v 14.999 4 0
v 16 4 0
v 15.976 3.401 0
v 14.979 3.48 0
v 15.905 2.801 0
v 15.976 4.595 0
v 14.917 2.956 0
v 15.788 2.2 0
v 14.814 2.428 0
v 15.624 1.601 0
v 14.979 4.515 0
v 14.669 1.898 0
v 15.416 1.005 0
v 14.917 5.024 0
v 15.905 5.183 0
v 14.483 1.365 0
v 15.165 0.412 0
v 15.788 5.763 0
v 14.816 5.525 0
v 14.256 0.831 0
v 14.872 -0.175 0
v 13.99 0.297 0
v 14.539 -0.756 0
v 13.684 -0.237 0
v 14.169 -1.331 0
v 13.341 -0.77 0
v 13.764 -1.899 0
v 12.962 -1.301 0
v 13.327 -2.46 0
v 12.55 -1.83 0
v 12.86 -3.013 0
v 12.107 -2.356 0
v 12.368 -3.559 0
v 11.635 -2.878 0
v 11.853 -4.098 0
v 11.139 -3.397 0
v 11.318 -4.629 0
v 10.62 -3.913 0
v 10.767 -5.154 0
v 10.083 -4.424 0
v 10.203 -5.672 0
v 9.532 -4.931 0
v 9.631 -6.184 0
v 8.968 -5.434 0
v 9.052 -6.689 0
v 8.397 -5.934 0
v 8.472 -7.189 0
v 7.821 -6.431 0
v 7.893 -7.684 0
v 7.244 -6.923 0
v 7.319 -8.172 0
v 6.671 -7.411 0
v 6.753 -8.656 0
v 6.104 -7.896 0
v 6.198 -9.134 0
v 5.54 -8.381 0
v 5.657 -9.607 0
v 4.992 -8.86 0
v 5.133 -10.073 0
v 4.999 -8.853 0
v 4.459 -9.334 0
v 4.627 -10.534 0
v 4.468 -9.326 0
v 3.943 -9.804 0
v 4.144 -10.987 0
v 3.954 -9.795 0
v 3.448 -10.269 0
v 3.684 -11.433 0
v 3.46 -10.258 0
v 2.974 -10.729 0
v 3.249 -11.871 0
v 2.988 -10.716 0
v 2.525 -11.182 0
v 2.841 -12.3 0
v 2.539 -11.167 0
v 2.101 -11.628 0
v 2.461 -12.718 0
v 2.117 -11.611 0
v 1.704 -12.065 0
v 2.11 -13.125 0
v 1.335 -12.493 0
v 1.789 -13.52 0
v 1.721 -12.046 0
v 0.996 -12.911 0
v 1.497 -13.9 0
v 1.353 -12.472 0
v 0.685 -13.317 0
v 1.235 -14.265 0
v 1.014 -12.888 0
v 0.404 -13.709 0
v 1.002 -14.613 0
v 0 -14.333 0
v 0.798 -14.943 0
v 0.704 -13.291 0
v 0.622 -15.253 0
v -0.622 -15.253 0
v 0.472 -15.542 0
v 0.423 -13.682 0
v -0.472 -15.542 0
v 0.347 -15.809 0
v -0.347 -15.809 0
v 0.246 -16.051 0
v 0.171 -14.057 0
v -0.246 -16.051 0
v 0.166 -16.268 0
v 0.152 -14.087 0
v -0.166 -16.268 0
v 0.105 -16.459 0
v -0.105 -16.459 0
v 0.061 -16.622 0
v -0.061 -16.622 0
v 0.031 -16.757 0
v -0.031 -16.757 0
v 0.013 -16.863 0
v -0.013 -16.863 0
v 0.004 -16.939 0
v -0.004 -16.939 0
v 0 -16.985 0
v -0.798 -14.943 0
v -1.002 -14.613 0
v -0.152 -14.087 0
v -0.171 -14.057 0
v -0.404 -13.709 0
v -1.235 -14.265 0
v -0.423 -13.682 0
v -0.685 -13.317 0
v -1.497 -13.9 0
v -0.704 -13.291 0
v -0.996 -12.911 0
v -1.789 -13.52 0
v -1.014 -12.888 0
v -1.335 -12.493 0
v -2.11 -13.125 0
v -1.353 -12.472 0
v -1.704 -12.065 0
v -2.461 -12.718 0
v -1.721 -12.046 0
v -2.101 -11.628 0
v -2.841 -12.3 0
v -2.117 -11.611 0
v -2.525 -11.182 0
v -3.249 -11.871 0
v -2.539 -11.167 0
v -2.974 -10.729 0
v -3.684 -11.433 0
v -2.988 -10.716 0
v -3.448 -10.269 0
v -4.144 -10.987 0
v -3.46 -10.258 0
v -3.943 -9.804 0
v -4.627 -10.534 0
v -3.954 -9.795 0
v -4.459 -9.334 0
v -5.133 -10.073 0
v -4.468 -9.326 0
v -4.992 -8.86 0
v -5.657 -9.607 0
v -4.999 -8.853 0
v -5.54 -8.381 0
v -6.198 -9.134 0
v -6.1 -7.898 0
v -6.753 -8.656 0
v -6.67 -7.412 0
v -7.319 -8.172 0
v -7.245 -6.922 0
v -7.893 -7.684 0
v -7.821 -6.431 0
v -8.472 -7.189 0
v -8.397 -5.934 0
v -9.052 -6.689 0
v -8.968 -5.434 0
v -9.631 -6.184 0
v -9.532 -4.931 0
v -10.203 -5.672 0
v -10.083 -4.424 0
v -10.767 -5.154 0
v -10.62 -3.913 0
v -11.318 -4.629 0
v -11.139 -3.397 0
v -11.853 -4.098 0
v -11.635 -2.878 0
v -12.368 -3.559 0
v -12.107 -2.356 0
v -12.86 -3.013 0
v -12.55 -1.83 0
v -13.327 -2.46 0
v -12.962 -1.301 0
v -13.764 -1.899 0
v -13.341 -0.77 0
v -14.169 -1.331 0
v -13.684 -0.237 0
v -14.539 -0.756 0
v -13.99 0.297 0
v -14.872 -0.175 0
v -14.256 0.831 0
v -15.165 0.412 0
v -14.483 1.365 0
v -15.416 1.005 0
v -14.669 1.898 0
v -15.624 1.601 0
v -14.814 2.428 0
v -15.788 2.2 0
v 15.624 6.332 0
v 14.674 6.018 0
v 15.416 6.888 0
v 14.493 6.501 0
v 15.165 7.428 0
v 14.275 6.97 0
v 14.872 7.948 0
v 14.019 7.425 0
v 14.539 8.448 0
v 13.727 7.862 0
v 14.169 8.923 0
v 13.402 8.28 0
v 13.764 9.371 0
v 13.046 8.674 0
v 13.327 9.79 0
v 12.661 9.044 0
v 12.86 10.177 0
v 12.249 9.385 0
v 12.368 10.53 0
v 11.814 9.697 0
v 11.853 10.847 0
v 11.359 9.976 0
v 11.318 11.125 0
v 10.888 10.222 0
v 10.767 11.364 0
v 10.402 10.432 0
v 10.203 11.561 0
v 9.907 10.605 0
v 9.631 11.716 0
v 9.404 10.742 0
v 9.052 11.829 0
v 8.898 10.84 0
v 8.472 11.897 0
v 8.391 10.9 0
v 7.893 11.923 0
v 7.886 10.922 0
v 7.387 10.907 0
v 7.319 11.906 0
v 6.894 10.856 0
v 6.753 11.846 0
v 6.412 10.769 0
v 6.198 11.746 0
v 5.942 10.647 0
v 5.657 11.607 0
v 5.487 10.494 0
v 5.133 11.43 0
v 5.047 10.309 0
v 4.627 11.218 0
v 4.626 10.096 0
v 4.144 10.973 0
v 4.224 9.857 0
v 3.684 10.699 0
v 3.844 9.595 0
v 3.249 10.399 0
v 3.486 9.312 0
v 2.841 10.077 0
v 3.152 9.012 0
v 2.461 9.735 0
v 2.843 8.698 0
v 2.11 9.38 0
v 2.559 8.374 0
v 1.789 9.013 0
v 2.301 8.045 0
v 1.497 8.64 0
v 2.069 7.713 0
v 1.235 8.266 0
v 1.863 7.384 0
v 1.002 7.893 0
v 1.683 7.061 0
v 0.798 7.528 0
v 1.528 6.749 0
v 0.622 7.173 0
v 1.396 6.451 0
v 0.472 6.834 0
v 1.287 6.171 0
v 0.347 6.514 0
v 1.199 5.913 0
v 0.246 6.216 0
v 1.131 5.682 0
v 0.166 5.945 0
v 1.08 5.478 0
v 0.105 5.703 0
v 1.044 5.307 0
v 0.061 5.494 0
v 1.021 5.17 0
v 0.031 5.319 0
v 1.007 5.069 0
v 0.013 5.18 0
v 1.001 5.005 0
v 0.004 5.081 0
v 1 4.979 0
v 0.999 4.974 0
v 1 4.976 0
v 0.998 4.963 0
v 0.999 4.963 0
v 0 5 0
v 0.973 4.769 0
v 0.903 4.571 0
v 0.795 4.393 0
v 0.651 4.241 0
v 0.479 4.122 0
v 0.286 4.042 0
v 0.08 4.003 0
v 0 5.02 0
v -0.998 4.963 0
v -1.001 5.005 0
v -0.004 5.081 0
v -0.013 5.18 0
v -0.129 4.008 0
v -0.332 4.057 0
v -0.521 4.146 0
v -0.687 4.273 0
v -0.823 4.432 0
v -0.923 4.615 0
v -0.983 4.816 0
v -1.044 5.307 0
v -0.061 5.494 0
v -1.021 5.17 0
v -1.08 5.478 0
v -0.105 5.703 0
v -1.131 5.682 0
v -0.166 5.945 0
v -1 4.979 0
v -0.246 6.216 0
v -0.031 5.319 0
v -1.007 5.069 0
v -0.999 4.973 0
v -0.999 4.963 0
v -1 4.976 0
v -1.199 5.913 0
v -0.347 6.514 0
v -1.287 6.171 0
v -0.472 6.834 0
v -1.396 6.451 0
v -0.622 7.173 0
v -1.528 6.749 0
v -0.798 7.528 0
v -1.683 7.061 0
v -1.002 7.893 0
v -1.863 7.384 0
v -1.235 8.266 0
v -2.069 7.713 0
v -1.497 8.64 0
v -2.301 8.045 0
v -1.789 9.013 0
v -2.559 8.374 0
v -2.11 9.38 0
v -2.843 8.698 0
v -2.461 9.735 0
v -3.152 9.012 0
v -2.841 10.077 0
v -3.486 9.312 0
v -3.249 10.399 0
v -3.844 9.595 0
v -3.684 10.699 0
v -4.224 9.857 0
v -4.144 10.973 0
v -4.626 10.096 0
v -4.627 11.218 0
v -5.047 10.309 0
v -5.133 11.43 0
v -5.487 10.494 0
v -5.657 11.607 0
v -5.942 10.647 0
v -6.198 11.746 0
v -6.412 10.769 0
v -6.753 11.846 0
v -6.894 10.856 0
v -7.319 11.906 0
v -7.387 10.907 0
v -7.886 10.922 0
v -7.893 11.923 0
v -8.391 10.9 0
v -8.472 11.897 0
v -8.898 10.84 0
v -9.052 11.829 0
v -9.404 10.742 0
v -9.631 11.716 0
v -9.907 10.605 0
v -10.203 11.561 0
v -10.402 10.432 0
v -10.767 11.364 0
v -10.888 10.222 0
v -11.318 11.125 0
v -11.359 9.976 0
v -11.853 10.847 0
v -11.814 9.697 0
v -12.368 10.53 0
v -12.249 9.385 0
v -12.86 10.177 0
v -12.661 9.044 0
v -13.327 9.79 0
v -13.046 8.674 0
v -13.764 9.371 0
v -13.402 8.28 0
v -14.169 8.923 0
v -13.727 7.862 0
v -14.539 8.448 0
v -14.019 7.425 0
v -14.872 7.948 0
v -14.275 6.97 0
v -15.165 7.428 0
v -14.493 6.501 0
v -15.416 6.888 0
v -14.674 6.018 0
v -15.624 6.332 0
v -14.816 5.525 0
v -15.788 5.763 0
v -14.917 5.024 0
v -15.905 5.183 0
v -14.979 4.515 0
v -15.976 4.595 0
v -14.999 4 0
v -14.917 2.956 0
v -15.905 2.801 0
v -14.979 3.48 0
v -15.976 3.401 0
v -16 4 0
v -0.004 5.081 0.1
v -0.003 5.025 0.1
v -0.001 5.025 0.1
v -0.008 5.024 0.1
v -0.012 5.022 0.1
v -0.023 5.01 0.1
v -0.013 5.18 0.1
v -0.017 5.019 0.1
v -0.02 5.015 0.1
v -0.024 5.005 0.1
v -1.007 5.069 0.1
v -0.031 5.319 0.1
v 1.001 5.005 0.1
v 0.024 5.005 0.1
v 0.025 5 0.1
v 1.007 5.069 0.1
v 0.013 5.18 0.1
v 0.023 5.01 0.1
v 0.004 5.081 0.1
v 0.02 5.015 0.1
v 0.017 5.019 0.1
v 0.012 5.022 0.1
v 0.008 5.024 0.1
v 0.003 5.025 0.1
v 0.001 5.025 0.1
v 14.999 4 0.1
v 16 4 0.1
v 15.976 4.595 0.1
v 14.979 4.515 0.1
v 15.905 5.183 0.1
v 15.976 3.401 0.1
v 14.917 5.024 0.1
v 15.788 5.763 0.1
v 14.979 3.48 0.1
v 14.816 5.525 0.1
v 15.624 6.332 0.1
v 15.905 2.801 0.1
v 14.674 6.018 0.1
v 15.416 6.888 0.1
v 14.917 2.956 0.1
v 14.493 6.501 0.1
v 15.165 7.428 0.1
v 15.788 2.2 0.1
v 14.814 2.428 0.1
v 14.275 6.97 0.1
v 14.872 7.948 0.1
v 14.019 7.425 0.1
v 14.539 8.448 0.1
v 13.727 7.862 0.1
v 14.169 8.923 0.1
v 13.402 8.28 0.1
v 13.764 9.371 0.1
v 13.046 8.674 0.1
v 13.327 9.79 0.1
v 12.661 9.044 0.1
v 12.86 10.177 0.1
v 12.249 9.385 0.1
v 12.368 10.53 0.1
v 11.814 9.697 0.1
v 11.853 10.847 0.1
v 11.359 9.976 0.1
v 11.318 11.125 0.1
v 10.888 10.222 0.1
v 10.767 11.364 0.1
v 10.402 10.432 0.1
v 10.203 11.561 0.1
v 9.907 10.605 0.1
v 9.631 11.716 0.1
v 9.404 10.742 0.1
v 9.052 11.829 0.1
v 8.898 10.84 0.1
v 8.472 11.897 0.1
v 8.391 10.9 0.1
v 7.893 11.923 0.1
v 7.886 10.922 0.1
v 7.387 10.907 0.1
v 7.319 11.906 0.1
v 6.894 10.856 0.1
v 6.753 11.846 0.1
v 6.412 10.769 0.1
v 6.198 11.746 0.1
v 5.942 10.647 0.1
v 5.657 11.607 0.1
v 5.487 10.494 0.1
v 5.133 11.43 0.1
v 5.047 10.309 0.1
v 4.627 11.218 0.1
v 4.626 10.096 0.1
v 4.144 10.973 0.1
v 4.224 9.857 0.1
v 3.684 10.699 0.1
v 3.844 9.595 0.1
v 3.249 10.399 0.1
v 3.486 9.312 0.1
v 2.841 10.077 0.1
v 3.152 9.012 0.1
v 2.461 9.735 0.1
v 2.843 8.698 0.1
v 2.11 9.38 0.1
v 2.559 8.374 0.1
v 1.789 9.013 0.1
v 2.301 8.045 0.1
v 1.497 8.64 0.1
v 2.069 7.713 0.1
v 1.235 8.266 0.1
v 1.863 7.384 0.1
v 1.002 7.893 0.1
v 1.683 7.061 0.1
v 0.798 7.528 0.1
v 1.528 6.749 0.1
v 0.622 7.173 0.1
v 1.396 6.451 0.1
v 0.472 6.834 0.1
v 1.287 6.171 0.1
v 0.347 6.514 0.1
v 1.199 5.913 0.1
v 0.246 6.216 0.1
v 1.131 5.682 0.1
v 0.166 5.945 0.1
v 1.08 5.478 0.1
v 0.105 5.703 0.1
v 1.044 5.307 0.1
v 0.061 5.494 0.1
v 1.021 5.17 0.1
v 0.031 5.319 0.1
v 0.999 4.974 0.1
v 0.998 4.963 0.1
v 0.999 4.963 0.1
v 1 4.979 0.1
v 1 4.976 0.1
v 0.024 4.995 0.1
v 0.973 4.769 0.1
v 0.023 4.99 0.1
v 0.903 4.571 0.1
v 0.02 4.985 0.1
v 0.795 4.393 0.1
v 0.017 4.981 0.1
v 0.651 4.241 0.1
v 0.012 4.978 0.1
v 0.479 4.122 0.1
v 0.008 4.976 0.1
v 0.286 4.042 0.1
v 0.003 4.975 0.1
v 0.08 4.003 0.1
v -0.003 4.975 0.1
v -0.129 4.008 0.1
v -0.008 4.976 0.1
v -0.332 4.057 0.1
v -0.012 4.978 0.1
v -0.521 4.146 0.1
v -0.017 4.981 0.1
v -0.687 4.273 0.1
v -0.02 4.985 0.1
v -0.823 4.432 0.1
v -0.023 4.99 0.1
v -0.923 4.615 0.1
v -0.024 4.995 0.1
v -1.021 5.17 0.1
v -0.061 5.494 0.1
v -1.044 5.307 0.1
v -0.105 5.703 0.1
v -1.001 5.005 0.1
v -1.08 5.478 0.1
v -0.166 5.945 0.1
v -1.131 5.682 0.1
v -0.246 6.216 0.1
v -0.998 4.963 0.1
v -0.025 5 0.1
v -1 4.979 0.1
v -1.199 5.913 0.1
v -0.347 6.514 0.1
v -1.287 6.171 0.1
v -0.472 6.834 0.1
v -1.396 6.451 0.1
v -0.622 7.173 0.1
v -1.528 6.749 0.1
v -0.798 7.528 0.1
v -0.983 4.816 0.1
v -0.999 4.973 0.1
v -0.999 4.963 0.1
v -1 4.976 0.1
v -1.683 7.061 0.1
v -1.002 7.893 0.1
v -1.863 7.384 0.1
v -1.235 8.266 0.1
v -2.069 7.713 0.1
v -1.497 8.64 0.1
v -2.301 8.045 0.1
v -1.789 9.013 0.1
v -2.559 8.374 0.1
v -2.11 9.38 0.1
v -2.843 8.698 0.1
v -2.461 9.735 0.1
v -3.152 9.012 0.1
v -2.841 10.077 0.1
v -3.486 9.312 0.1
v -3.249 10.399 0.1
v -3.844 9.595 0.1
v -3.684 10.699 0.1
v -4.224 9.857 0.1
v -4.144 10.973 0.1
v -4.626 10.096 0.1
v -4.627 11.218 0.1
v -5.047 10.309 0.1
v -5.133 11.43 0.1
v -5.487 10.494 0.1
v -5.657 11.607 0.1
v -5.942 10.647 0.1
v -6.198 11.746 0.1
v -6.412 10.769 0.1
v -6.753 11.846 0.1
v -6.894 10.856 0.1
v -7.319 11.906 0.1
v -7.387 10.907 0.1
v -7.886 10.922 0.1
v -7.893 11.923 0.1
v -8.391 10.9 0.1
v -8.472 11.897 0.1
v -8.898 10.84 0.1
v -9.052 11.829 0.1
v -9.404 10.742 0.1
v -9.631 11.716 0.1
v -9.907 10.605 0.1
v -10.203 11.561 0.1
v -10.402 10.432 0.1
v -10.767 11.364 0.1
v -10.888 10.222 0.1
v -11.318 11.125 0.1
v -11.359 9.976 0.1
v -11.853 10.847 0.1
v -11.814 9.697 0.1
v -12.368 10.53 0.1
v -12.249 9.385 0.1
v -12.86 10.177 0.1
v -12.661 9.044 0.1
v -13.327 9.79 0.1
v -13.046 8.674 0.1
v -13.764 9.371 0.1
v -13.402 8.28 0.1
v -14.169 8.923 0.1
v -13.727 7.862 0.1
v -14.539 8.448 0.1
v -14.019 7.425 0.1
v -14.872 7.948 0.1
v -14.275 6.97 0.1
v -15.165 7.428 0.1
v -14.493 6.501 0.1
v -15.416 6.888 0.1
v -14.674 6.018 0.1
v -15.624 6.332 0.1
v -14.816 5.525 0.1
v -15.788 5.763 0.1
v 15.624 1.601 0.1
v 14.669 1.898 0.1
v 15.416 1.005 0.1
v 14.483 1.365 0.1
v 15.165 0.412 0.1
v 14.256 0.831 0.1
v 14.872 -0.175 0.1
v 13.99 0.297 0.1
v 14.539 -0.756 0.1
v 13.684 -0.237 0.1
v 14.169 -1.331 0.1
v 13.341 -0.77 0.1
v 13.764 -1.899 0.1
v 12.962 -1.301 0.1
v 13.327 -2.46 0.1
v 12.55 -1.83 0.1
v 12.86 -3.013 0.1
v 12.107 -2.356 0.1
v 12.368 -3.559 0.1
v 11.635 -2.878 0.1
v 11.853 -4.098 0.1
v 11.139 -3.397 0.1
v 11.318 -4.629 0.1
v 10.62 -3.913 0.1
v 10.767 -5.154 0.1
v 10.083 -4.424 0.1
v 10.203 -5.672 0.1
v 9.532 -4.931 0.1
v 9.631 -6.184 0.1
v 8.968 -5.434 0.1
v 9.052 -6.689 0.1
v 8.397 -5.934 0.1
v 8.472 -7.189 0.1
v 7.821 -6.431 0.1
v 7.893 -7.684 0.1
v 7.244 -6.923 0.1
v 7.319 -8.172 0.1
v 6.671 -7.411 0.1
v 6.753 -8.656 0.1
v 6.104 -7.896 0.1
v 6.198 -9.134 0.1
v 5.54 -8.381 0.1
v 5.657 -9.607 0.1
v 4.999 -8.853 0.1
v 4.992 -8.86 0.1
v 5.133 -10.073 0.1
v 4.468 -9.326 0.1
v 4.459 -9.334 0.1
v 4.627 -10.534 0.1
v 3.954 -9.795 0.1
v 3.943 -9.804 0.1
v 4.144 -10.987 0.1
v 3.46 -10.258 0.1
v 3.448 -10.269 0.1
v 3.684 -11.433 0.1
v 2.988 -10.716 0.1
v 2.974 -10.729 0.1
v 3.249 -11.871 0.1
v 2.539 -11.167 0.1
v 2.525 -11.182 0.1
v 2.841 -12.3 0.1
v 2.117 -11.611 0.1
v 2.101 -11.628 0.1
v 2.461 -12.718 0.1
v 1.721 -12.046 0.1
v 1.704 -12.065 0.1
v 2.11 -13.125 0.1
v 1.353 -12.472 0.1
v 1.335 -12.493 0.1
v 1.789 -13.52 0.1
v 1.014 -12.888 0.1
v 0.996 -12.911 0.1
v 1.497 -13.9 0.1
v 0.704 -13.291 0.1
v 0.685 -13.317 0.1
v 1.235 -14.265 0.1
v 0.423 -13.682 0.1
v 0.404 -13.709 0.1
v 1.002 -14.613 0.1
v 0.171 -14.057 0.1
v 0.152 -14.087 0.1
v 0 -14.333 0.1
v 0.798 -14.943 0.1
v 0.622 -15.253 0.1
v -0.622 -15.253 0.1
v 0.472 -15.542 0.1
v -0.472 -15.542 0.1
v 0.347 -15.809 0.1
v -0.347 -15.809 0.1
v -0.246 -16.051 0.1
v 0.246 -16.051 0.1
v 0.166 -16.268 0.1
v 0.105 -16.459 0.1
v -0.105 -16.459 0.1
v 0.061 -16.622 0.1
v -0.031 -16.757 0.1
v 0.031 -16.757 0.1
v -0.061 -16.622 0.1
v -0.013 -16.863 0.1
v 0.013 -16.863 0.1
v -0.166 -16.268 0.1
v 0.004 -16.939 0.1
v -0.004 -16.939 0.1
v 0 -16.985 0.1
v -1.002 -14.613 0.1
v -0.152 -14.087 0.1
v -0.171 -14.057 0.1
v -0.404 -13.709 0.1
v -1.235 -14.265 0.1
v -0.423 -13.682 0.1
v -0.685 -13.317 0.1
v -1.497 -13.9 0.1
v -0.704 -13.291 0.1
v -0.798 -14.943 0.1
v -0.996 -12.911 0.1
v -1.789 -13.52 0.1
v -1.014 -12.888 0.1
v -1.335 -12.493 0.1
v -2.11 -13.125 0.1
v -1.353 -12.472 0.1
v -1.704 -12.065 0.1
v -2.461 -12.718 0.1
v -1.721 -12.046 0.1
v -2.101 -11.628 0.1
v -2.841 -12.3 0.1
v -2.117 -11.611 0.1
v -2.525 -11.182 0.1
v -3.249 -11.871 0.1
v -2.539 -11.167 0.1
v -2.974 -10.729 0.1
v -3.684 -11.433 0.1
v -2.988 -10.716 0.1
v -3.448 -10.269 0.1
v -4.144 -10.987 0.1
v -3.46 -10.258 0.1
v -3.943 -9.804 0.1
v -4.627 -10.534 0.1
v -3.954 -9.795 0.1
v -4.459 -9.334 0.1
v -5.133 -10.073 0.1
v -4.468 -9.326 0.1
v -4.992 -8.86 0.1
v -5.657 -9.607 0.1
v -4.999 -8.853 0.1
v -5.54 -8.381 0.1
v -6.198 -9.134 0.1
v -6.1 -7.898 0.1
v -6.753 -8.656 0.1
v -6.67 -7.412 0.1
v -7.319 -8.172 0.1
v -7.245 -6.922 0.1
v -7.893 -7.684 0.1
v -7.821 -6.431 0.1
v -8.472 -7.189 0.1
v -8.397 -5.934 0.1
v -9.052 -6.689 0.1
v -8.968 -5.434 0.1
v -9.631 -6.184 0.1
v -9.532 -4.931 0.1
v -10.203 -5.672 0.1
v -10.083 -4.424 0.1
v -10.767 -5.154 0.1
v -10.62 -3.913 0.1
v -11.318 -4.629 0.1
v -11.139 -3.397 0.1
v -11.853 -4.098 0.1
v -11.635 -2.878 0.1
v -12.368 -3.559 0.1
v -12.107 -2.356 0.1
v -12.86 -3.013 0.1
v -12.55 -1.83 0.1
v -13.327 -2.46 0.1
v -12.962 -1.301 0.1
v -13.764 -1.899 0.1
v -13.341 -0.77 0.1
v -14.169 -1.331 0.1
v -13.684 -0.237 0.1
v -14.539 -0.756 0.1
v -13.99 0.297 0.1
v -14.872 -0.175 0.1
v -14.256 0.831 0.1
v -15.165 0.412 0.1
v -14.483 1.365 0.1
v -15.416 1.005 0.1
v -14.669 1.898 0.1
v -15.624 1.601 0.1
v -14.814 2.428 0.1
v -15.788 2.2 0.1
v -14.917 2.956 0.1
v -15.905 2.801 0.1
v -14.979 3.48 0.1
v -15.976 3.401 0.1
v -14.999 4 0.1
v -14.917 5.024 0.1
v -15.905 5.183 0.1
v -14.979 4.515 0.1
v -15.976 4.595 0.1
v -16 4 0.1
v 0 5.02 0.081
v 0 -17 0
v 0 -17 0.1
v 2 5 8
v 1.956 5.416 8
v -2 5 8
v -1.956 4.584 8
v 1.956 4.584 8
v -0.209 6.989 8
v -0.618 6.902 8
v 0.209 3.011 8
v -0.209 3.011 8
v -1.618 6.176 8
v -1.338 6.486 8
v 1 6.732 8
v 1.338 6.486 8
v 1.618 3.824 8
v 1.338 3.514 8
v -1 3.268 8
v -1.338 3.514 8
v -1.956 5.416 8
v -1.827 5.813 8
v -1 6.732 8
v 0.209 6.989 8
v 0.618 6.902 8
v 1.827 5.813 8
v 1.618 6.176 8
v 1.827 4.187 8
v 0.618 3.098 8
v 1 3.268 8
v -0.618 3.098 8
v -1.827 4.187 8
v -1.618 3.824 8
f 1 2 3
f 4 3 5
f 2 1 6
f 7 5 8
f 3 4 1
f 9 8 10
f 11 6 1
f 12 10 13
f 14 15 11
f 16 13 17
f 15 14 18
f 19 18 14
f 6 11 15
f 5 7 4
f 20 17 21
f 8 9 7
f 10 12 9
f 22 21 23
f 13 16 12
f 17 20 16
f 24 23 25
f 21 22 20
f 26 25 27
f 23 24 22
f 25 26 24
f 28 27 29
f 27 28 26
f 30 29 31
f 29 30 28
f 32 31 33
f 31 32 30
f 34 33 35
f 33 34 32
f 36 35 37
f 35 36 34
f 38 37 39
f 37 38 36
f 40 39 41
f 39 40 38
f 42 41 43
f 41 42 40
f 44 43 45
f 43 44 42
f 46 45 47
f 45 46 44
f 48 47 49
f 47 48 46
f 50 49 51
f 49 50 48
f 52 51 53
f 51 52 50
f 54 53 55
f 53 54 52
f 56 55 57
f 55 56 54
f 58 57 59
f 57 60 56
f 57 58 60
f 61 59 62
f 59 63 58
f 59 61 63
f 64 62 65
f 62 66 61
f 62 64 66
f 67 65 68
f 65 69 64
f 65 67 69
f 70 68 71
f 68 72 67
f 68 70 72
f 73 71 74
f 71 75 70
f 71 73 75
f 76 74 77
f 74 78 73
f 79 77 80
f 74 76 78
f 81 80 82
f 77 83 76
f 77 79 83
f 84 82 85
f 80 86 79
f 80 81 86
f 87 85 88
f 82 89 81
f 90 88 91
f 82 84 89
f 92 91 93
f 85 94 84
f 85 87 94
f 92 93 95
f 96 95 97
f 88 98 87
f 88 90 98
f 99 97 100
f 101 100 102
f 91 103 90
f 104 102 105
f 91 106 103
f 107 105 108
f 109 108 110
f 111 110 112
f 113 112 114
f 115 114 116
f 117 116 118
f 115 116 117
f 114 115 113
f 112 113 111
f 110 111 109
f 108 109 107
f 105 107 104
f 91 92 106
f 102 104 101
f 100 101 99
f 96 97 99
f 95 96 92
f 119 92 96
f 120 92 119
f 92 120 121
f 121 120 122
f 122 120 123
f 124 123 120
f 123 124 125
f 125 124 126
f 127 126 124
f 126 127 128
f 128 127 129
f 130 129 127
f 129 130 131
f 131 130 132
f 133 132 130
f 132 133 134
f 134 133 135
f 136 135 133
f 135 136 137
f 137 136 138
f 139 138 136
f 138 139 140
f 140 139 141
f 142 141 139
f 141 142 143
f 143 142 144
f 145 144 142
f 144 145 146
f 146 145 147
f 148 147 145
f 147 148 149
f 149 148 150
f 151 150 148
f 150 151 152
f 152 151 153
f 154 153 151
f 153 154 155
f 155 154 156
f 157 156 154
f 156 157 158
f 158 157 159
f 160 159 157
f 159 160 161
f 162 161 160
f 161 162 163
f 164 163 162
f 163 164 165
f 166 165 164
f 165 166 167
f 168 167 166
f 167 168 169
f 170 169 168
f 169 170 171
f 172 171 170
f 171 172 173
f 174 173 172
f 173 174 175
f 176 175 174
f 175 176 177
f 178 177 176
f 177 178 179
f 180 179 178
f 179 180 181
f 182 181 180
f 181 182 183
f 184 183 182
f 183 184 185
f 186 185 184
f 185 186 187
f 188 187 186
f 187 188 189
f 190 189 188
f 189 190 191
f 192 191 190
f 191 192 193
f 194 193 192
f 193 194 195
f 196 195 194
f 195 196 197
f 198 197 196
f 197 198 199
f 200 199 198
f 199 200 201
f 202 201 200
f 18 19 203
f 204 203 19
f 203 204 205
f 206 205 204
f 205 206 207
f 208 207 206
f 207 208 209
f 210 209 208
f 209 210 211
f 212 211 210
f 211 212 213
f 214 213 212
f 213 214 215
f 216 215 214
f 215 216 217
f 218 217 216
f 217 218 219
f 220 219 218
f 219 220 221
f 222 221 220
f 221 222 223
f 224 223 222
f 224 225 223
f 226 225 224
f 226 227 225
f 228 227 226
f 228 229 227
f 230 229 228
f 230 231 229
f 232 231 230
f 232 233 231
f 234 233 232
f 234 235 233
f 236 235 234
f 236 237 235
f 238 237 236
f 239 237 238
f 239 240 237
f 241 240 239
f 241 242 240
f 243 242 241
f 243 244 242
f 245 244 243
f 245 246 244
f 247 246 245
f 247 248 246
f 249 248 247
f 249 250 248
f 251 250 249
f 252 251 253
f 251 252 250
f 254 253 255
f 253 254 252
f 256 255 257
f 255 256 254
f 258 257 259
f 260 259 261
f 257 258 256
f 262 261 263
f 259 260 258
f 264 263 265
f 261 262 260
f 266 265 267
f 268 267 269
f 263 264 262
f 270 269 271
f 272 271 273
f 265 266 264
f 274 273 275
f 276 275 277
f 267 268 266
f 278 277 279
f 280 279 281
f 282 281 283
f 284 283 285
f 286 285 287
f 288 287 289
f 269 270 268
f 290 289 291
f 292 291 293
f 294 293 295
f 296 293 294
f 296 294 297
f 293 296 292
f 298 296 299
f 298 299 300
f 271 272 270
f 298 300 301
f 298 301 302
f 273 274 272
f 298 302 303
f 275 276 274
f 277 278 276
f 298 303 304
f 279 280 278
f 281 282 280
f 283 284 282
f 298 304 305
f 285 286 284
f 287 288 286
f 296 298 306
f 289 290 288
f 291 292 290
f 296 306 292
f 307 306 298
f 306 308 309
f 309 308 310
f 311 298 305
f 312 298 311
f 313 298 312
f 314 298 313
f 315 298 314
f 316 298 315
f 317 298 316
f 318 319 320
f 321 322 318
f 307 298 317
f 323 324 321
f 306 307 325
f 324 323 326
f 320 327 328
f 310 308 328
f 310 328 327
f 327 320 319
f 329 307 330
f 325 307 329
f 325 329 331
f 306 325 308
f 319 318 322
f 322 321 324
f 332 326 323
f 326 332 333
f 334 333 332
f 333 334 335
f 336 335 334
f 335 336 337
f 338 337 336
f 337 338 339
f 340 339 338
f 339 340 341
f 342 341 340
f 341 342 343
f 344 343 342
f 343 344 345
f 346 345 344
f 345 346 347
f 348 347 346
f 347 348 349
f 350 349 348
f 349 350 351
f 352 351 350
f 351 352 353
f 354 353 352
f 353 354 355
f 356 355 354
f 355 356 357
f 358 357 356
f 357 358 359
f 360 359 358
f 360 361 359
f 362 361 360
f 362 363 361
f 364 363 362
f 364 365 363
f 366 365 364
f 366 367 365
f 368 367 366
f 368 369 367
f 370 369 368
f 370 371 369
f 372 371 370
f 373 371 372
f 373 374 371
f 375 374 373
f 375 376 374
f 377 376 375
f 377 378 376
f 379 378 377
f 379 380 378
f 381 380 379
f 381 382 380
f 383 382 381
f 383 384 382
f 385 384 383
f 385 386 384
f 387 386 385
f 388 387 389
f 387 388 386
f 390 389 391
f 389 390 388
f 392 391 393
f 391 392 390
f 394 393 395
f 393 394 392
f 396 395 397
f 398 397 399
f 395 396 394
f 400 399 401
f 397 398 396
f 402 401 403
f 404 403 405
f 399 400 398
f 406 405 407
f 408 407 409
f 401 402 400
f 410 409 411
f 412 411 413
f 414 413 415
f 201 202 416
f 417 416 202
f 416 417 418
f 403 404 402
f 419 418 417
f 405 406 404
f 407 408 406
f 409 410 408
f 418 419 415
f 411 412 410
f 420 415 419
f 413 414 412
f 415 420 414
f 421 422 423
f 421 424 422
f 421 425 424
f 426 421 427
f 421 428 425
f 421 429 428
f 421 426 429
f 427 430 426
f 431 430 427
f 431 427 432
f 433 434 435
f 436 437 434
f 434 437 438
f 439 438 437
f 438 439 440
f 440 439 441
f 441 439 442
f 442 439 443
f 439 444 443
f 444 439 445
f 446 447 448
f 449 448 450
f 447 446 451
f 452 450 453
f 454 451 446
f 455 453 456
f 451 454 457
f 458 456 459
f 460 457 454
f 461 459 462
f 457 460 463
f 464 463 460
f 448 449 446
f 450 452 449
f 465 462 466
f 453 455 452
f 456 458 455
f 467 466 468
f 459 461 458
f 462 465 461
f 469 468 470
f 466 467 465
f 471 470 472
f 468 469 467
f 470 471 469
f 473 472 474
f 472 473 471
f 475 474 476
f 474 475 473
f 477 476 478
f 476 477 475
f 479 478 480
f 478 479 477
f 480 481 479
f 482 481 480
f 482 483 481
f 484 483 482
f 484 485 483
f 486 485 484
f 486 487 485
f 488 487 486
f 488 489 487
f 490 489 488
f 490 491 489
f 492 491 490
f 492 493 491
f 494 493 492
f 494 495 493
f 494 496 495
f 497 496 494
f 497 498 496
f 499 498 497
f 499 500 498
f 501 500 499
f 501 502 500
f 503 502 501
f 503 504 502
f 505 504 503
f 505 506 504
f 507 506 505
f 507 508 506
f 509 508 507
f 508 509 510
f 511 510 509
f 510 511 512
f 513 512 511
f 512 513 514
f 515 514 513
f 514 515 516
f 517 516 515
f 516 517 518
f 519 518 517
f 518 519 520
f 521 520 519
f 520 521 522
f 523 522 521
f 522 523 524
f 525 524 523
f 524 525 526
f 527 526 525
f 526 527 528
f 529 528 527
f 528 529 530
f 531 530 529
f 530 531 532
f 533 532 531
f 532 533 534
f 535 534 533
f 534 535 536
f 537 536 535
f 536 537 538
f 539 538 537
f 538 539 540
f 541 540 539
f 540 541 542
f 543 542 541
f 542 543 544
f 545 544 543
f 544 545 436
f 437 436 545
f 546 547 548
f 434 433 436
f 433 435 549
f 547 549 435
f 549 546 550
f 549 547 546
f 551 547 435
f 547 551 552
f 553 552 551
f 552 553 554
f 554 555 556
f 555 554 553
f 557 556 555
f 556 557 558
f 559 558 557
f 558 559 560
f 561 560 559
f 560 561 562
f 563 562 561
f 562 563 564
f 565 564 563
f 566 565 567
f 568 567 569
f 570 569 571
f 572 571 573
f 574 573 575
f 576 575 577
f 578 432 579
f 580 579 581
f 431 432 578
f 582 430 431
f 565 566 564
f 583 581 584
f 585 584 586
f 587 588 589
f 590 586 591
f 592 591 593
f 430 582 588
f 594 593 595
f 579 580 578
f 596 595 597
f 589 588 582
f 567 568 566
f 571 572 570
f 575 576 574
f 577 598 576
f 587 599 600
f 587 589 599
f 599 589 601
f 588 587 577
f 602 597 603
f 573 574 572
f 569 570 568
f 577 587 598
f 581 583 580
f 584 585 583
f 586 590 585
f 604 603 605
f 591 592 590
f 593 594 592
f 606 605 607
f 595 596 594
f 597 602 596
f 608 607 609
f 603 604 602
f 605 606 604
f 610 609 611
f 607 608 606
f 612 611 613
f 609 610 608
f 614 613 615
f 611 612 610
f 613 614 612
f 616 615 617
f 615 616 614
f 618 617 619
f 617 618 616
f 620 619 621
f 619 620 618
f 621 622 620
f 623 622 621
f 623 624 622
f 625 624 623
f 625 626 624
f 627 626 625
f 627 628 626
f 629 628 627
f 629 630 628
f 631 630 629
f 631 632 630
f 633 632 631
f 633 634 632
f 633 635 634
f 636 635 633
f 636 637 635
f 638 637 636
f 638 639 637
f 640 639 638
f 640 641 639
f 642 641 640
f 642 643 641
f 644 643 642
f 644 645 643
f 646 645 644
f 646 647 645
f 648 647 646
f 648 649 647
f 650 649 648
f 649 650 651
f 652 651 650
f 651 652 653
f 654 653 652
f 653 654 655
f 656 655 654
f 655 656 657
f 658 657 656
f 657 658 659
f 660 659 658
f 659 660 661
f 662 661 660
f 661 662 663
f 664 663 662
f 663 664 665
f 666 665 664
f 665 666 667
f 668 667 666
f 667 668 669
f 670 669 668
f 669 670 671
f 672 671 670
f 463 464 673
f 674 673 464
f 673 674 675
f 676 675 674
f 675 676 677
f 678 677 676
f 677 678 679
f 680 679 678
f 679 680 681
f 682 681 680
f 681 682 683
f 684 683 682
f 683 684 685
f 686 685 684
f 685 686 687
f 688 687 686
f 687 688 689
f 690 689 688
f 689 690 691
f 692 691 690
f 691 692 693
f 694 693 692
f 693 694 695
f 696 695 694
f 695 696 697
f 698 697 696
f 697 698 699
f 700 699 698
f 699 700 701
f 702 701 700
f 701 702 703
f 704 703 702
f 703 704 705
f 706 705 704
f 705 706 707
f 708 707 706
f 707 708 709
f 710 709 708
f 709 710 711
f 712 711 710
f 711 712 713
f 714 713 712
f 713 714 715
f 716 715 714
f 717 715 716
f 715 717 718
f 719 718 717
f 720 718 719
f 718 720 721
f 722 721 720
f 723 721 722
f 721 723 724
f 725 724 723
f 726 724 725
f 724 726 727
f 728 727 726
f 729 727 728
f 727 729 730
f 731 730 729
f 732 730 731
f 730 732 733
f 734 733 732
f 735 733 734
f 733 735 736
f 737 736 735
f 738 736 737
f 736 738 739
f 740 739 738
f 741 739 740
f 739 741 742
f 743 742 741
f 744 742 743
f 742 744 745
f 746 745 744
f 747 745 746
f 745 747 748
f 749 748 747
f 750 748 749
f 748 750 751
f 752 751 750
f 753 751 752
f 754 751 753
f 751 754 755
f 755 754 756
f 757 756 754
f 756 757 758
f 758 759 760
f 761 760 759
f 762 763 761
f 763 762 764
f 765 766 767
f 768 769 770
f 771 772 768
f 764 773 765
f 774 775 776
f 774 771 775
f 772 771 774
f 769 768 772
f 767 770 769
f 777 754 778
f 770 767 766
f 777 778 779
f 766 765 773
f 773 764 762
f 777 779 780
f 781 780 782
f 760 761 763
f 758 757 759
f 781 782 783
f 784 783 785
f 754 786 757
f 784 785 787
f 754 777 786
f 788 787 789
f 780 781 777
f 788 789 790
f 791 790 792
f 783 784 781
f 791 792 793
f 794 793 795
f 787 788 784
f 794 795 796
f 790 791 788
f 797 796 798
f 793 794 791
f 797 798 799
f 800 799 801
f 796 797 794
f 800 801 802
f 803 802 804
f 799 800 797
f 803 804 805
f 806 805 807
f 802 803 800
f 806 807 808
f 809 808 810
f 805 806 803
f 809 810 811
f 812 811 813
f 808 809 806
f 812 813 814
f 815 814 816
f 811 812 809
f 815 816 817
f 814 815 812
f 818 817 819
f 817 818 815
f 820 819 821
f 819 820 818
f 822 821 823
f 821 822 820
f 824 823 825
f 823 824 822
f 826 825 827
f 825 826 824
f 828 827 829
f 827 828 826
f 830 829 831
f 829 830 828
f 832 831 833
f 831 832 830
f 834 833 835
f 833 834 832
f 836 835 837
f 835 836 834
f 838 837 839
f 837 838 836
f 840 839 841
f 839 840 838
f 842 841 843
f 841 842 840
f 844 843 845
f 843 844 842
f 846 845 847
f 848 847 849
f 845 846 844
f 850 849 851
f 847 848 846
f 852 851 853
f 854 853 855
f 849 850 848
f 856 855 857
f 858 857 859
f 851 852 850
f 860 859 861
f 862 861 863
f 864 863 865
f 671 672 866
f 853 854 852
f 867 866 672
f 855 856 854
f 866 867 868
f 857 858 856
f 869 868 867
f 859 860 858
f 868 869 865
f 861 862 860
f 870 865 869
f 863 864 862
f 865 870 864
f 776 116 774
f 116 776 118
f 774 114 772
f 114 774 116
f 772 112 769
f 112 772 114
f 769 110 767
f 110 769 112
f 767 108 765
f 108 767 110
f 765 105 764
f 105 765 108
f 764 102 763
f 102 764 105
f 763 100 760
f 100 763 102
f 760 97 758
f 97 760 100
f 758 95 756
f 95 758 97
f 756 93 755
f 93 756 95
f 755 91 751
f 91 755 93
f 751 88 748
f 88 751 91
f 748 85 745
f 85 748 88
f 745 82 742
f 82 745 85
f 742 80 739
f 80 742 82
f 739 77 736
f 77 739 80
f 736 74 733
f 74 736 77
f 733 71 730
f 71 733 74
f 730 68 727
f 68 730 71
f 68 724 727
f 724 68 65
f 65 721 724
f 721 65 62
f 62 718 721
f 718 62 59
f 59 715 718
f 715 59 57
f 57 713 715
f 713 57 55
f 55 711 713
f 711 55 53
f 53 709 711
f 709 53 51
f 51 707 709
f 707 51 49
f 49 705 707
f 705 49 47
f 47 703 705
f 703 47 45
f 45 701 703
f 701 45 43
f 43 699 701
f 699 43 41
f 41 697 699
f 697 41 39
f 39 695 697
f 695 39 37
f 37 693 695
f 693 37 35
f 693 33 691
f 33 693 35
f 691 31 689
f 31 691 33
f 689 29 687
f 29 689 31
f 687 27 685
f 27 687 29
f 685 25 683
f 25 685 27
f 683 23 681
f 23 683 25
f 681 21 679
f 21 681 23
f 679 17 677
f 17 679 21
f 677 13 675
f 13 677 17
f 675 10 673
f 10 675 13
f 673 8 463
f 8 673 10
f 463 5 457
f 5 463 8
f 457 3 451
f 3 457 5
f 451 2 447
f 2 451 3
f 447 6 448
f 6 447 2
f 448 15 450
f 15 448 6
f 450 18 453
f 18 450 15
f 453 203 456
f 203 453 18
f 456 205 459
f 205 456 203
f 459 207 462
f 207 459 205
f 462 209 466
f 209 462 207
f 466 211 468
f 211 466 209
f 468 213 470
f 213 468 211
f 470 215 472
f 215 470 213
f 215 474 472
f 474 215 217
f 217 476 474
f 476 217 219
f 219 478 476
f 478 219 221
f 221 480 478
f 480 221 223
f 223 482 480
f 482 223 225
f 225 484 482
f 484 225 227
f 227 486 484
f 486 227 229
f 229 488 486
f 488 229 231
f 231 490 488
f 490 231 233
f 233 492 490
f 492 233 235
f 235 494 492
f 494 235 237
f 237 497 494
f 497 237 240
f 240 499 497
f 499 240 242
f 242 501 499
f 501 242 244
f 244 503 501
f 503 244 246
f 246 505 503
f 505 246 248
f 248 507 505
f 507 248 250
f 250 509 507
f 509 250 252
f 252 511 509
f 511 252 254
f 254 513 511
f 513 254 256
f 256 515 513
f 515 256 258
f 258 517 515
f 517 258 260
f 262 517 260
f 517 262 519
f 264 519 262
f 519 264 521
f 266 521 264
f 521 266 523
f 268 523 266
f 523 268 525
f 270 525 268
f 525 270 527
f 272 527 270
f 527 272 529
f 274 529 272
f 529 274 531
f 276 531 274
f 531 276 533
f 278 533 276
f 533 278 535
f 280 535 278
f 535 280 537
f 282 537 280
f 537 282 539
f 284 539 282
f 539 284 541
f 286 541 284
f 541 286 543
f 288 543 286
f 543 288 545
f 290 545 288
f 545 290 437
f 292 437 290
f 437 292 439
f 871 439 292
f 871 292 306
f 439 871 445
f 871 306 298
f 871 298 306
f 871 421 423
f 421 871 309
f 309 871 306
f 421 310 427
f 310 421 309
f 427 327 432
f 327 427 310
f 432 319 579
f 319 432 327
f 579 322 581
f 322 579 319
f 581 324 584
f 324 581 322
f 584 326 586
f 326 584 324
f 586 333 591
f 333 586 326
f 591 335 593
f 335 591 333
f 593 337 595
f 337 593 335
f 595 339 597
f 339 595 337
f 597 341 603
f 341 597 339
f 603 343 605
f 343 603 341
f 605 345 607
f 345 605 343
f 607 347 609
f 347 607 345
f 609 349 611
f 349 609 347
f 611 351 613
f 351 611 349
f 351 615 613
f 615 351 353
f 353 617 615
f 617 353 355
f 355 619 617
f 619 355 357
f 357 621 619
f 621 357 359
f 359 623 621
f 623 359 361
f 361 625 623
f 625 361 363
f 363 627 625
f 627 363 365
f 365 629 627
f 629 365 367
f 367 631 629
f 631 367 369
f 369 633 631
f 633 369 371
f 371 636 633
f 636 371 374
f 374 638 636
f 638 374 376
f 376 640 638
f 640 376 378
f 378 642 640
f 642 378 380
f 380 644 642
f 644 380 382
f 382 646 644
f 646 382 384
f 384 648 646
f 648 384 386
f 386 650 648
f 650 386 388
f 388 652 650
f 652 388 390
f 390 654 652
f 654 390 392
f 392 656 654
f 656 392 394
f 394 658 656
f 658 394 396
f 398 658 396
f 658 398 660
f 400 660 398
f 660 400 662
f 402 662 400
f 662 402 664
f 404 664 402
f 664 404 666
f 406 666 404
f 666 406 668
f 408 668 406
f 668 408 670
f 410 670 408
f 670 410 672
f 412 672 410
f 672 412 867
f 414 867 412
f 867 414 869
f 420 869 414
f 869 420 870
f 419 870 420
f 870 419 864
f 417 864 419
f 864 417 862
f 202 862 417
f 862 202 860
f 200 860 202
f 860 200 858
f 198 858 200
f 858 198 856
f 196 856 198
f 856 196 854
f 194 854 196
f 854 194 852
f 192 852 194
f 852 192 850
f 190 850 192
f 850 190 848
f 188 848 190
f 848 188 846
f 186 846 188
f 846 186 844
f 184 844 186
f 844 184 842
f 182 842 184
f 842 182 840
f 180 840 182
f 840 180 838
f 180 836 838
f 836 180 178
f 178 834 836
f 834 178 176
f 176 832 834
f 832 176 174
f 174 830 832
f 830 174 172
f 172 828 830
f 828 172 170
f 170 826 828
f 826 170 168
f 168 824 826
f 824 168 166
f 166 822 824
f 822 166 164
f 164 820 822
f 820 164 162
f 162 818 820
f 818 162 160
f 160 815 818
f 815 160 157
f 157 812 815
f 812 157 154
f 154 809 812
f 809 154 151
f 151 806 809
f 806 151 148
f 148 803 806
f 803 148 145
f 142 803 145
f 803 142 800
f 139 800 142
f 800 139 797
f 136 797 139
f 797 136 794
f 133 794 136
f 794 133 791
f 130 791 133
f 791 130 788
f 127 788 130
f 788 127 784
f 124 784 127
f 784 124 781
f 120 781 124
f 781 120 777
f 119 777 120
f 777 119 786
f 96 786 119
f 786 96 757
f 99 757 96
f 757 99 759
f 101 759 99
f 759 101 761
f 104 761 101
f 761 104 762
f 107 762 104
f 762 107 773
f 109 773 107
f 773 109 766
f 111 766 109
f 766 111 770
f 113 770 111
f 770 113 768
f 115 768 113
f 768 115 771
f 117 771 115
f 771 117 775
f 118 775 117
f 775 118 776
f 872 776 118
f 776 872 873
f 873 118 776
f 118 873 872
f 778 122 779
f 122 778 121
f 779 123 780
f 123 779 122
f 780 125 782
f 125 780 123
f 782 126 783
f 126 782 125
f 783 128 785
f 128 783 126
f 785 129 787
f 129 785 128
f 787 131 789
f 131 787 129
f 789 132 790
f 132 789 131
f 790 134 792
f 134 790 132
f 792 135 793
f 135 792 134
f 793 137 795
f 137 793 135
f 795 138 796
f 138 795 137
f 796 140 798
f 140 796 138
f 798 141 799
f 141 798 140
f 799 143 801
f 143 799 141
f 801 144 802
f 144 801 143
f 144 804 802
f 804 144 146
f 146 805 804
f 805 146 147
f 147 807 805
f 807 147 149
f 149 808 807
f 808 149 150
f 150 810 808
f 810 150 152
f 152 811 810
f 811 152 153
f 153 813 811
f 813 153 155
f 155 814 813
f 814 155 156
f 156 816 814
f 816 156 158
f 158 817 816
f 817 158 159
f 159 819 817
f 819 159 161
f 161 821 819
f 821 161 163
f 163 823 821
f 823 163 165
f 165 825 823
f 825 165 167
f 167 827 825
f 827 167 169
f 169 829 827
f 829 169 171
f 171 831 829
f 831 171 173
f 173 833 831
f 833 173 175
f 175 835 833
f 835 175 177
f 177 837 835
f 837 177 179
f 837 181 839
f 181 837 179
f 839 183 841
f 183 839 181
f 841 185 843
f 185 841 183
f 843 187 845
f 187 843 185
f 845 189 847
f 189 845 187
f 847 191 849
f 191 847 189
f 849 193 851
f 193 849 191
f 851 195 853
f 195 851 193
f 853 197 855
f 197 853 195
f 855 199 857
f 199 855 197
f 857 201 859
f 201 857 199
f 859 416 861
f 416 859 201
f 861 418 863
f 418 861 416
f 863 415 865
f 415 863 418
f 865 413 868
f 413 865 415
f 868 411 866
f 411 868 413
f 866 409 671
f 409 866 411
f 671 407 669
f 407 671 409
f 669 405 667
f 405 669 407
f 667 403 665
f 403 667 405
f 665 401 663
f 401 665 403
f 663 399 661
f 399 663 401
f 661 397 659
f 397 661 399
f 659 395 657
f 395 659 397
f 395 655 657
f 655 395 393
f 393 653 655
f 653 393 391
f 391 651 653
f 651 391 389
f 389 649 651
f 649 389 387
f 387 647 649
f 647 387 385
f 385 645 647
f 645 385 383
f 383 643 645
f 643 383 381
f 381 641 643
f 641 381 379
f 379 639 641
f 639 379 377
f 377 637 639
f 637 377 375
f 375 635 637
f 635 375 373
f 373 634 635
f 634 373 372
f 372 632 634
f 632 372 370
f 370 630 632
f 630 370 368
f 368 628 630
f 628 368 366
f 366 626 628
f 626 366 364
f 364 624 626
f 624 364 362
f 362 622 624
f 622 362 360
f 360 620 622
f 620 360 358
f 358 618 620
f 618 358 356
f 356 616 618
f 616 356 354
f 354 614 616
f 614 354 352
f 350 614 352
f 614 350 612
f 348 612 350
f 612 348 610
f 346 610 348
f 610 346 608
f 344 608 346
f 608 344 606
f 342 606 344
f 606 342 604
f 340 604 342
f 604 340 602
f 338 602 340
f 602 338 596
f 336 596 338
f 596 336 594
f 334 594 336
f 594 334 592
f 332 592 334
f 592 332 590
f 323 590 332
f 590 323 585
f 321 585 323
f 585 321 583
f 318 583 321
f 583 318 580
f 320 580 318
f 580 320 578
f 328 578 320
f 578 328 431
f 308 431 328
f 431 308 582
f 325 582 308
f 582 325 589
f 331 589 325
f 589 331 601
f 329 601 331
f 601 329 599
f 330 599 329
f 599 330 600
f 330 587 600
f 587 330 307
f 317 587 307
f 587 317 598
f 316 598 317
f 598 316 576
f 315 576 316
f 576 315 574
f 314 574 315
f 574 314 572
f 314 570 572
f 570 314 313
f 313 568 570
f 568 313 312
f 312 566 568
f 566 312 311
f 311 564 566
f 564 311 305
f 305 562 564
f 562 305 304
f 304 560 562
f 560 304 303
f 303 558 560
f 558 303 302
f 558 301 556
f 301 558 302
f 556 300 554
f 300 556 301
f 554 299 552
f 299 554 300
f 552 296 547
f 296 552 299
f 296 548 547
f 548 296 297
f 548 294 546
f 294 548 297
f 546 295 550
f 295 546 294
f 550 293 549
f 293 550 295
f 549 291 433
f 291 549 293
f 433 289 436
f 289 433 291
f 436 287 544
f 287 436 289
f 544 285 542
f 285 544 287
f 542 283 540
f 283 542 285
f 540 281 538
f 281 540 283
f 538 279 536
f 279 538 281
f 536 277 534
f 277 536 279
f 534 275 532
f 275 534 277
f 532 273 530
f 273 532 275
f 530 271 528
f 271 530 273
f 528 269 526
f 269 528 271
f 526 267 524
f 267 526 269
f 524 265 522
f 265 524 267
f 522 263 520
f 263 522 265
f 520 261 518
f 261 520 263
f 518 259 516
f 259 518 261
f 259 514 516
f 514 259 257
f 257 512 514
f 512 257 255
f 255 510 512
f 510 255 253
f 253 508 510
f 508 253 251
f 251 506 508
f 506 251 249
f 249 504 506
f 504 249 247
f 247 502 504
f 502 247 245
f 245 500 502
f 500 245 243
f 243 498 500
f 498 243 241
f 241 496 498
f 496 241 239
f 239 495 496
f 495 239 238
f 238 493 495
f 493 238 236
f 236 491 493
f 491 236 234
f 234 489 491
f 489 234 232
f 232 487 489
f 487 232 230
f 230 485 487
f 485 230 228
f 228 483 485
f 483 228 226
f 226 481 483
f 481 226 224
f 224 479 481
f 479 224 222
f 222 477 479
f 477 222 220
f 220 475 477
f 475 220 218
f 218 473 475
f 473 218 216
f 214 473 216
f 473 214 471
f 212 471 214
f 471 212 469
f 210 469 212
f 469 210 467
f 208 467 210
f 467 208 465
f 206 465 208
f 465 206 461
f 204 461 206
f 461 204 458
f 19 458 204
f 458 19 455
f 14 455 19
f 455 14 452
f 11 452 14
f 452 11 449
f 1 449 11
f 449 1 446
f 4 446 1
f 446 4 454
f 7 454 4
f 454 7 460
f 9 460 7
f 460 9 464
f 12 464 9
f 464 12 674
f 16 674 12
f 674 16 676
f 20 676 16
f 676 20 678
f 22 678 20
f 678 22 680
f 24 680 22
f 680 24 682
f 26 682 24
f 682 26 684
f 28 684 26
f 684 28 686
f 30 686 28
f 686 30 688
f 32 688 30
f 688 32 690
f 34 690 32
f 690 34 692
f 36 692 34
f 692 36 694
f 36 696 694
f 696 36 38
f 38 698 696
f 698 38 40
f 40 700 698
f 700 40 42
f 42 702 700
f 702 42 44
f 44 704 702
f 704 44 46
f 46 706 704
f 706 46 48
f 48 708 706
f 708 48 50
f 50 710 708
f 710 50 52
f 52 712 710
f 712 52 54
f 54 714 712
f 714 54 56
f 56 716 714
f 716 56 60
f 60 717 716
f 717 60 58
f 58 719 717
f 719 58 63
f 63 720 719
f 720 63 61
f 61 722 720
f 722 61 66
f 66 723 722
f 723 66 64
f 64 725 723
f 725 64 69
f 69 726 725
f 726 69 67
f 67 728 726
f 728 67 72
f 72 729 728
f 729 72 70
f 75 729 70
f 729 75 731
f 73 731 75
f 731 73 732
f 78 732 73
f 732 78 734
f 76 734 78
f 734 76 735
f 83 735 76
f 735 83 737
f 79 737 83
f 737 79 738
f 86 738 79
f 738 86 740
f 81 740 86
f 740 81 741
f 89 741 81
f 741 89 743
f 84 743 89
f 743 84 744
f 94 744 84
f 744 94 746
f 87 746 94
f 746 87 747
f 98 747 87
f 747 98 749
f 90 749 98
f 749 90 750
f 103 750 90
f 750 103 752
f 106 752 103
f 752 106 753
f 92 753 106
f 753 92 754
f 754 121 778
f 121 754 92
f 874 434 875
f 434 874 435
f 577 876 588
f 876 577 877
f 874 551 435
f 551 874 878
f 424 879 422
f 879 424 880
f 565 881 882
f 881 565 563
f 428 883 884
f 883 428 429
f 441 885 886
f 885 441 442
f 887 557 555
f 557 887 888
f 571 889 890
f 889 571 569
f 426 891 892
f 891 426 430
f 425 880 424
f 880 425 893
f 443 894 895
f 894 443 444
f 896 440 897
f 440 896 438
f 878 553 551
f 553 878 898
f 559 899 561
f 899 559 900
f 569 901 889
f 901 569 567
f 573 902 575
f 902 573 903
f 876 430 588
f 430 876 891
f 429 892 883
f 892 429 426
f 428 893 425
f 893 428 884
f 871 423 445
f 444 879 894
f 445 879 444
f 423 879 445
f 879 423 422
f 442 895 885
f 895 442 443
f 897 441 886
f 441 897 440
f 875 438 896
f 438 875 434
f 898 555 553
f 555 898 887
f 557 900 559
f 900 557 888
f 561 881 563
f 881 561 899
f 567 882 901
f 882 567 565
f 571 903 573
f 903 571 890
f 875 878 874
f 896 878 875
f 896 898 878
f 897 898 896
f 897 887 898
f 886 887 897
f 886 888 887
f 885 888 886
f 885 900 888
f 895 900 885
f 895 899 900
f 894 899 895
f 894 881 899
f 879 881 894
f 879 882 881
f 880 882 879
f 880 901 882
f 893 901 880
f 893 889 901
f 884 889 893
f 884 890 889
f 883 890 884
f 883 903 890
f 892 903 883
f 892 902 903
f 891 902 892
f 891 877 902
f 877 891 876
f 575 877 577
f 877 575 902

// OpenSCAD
// OpenSCAD 为免费开源的跨平台建模软件
// 作者：上海市第三女子初级中学 谢丁
/*
请打开视图菜单下的动画命令，在绘图区的下方，帧率处输入绘图的图像帧率，步数为绘制整个图形经过的步骤数，
我们可以采用帧率为20，步数为100进行查看
*/
pos = position($t); // 引入坐标与时间相关的变量

r = 2; // 圆锥底面半径
$fn = 30; // 绘图圆锥的精度

echo(pos); // 用于调试时候在控制台输出当前圆锥的坐标

function position(x) =
  [
    16 * pow(sin(360 * x), 3), // x 坐标
    13 * cos(360 * x) - 5 * cos(2 * 360 * x) - 2 * cos(3 * 360 * x) - cos(4 * 360 * x) // y坐标
  ];

module curve() // 这里其实绘制的是一个多边形，使用for循环进行迭代绘制
polygon([for (a = [ 0 : 0.005 : 1]) position(a)]);
// a 的起始值为0，步长值为0.005，终值为1，这里步长值大小决定了爱心的精度

module heart()
{ // 将外面的爱心与内部的爱心进行差值布尔运算后线性拉伸0.1个单位
  color("gold") linear_extrude(0.1) difference()
  {
    curve(); // 外面的爱心
    offset(-1) curve(); // 将爱心多边形向内偏移1个单位
  }
}

module target(x, y)
{
  translate([x, y, 2 * r]) // 绘图圆锥的位置
  cylinder(r1 = 0, r2 = r, h = 4 * r, center = true);
}

heart();
target(pos[0], pos[1]); // 圆锥的位置坐标pos[0]为x坐标，pos[1]为y坐标
